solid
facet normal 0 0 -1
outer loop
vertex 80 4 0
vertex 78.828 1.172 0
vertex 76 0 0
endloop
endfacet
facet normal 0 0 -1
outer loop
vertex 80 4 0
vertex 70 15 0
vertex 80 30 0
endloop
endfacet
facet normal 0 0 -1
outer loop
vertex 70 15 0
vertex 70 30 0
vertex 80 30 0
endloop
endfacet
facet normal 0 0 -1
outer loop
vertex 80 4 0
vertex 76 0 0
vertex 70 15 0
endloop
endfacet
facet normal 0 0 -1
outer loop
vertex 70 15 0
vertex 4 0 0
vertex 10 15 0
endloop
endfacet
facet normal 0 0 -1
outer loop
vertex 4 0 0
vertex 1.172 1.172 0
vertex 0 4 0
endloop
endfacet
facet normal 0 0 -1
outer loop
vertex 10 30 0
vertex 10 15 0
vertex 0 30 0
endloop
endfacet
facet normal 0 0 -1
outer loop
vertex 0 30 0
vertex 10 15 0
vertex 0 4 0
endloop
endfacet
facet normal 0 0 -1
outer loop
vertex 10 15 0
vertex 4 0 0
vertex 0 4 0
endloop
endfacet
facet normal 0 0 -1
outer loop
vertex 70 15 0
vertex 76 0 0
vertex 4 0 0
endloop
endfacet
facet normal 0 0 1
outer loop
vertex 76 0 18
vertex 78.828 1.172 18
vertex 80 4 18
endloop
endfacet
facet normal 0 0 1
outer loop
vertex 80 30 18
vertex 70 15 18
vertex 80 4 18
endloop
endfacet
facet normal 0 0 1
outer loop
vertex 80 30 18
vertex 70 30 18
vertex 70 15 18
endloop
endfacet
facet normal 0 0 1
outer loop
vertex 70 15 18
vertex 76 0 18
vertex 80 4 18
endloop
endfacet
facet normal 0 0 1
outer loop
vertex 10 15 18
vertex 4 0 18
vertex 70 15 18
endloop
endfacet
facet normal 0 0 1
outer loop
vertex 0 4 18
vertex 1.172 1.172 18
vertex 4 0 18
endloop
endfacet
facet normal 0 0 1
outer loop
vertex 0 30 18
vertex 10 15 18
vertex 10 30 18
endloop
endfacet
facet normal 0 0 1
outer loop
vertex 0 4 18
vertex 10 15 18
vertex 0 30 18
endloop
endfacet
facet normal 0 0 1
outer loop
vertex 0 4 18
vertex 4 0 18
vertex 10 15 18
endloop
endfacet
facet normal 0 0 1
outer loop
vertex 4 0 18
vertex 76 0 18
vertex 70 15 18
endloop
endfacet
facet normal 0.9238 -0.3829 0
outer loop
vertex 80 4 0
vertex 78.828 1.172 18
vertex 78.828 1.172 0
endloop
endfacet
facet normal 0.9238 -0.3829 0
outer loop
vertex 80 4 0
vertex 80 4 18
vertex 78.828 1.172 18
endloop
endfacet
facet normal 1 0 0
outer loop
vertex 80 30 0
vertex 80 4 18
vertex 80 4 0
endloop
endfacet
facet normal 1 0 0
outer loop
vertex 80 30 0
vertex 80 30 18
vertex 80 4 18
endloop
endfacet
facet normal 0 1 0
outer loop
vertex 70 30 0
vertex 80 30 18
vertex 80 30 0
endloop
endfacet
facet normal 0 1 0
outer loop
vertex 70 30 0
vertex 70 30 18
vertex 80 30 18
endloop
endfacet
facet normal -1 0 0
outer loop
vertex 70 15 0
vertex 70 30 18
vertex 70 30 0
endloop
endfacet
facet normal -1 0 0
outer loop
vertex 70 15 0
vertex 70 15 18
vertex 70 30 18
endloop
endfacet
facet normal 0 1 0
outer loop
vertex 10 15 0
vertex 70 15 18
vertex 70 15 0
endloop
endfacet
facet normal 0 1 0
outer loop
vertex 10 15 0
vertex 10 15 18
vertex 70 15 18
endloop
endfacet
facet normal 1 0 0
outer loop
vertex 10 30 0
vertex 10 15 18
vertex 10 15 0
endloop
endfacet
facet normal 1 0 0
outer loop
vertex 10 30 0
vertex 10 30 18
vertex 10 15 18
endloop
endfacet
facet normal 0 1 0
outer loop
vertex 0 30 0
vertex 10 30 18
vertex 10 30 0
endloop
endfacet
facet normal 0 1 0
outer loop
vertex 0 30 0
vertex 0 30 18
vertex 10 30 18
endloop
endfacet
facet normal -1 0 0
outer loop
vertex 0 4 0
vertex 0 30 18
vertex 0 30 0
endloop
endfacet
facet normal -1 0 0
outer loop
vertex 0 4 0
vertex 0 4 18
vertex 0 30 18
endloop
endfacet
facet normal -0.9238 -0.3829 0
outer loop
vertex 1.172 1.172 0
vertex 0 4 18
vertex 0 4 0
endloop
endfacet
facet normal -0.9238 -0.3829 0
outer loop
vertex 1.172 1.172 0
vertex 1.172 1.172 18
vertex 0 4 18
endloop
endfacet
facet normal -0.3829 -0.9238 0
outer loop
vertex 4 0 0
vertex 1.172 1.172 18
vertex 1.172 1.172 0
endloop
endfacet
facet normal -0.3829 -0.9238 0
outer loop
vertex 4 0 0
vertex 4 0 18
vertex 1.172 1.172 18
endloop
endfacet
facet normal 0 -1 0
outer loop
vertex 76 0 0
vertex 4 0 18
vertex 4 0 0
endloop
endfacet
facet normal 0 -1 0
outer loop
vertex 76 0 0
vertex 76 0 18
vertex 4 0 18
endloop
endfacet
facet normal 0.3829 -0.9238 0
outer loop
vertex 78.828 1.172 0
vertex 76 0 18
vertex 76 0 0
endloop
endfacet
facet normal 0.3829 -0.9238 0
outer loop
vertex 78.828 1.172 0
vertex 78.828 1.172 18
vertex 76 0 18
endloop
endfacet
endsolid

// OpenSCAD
$fn = 32;

// ----------------------------------------------------------------------
// Heat sink frame: 80 x 30 mm frame, 10 mm walls
// ----------------------------------------------------------------------

// --- parameters (mm) ---
profile_height = 18;      // extrusion height
profile_points = 12;      // points of the closed outline

profile = [[0, 4], [1.172, 1.172], [4, 0], [76, 0], [78.828, 1.172], [80, 4], [80, 30], [70, 30], [70, 15], [10, 15], [10, 30], [0, 30]];  // single closed polygon, 12 points, counter clockwise

// --- the one profile operation ---
linear_extrude(height = profile_height) polygon(points = profile);
